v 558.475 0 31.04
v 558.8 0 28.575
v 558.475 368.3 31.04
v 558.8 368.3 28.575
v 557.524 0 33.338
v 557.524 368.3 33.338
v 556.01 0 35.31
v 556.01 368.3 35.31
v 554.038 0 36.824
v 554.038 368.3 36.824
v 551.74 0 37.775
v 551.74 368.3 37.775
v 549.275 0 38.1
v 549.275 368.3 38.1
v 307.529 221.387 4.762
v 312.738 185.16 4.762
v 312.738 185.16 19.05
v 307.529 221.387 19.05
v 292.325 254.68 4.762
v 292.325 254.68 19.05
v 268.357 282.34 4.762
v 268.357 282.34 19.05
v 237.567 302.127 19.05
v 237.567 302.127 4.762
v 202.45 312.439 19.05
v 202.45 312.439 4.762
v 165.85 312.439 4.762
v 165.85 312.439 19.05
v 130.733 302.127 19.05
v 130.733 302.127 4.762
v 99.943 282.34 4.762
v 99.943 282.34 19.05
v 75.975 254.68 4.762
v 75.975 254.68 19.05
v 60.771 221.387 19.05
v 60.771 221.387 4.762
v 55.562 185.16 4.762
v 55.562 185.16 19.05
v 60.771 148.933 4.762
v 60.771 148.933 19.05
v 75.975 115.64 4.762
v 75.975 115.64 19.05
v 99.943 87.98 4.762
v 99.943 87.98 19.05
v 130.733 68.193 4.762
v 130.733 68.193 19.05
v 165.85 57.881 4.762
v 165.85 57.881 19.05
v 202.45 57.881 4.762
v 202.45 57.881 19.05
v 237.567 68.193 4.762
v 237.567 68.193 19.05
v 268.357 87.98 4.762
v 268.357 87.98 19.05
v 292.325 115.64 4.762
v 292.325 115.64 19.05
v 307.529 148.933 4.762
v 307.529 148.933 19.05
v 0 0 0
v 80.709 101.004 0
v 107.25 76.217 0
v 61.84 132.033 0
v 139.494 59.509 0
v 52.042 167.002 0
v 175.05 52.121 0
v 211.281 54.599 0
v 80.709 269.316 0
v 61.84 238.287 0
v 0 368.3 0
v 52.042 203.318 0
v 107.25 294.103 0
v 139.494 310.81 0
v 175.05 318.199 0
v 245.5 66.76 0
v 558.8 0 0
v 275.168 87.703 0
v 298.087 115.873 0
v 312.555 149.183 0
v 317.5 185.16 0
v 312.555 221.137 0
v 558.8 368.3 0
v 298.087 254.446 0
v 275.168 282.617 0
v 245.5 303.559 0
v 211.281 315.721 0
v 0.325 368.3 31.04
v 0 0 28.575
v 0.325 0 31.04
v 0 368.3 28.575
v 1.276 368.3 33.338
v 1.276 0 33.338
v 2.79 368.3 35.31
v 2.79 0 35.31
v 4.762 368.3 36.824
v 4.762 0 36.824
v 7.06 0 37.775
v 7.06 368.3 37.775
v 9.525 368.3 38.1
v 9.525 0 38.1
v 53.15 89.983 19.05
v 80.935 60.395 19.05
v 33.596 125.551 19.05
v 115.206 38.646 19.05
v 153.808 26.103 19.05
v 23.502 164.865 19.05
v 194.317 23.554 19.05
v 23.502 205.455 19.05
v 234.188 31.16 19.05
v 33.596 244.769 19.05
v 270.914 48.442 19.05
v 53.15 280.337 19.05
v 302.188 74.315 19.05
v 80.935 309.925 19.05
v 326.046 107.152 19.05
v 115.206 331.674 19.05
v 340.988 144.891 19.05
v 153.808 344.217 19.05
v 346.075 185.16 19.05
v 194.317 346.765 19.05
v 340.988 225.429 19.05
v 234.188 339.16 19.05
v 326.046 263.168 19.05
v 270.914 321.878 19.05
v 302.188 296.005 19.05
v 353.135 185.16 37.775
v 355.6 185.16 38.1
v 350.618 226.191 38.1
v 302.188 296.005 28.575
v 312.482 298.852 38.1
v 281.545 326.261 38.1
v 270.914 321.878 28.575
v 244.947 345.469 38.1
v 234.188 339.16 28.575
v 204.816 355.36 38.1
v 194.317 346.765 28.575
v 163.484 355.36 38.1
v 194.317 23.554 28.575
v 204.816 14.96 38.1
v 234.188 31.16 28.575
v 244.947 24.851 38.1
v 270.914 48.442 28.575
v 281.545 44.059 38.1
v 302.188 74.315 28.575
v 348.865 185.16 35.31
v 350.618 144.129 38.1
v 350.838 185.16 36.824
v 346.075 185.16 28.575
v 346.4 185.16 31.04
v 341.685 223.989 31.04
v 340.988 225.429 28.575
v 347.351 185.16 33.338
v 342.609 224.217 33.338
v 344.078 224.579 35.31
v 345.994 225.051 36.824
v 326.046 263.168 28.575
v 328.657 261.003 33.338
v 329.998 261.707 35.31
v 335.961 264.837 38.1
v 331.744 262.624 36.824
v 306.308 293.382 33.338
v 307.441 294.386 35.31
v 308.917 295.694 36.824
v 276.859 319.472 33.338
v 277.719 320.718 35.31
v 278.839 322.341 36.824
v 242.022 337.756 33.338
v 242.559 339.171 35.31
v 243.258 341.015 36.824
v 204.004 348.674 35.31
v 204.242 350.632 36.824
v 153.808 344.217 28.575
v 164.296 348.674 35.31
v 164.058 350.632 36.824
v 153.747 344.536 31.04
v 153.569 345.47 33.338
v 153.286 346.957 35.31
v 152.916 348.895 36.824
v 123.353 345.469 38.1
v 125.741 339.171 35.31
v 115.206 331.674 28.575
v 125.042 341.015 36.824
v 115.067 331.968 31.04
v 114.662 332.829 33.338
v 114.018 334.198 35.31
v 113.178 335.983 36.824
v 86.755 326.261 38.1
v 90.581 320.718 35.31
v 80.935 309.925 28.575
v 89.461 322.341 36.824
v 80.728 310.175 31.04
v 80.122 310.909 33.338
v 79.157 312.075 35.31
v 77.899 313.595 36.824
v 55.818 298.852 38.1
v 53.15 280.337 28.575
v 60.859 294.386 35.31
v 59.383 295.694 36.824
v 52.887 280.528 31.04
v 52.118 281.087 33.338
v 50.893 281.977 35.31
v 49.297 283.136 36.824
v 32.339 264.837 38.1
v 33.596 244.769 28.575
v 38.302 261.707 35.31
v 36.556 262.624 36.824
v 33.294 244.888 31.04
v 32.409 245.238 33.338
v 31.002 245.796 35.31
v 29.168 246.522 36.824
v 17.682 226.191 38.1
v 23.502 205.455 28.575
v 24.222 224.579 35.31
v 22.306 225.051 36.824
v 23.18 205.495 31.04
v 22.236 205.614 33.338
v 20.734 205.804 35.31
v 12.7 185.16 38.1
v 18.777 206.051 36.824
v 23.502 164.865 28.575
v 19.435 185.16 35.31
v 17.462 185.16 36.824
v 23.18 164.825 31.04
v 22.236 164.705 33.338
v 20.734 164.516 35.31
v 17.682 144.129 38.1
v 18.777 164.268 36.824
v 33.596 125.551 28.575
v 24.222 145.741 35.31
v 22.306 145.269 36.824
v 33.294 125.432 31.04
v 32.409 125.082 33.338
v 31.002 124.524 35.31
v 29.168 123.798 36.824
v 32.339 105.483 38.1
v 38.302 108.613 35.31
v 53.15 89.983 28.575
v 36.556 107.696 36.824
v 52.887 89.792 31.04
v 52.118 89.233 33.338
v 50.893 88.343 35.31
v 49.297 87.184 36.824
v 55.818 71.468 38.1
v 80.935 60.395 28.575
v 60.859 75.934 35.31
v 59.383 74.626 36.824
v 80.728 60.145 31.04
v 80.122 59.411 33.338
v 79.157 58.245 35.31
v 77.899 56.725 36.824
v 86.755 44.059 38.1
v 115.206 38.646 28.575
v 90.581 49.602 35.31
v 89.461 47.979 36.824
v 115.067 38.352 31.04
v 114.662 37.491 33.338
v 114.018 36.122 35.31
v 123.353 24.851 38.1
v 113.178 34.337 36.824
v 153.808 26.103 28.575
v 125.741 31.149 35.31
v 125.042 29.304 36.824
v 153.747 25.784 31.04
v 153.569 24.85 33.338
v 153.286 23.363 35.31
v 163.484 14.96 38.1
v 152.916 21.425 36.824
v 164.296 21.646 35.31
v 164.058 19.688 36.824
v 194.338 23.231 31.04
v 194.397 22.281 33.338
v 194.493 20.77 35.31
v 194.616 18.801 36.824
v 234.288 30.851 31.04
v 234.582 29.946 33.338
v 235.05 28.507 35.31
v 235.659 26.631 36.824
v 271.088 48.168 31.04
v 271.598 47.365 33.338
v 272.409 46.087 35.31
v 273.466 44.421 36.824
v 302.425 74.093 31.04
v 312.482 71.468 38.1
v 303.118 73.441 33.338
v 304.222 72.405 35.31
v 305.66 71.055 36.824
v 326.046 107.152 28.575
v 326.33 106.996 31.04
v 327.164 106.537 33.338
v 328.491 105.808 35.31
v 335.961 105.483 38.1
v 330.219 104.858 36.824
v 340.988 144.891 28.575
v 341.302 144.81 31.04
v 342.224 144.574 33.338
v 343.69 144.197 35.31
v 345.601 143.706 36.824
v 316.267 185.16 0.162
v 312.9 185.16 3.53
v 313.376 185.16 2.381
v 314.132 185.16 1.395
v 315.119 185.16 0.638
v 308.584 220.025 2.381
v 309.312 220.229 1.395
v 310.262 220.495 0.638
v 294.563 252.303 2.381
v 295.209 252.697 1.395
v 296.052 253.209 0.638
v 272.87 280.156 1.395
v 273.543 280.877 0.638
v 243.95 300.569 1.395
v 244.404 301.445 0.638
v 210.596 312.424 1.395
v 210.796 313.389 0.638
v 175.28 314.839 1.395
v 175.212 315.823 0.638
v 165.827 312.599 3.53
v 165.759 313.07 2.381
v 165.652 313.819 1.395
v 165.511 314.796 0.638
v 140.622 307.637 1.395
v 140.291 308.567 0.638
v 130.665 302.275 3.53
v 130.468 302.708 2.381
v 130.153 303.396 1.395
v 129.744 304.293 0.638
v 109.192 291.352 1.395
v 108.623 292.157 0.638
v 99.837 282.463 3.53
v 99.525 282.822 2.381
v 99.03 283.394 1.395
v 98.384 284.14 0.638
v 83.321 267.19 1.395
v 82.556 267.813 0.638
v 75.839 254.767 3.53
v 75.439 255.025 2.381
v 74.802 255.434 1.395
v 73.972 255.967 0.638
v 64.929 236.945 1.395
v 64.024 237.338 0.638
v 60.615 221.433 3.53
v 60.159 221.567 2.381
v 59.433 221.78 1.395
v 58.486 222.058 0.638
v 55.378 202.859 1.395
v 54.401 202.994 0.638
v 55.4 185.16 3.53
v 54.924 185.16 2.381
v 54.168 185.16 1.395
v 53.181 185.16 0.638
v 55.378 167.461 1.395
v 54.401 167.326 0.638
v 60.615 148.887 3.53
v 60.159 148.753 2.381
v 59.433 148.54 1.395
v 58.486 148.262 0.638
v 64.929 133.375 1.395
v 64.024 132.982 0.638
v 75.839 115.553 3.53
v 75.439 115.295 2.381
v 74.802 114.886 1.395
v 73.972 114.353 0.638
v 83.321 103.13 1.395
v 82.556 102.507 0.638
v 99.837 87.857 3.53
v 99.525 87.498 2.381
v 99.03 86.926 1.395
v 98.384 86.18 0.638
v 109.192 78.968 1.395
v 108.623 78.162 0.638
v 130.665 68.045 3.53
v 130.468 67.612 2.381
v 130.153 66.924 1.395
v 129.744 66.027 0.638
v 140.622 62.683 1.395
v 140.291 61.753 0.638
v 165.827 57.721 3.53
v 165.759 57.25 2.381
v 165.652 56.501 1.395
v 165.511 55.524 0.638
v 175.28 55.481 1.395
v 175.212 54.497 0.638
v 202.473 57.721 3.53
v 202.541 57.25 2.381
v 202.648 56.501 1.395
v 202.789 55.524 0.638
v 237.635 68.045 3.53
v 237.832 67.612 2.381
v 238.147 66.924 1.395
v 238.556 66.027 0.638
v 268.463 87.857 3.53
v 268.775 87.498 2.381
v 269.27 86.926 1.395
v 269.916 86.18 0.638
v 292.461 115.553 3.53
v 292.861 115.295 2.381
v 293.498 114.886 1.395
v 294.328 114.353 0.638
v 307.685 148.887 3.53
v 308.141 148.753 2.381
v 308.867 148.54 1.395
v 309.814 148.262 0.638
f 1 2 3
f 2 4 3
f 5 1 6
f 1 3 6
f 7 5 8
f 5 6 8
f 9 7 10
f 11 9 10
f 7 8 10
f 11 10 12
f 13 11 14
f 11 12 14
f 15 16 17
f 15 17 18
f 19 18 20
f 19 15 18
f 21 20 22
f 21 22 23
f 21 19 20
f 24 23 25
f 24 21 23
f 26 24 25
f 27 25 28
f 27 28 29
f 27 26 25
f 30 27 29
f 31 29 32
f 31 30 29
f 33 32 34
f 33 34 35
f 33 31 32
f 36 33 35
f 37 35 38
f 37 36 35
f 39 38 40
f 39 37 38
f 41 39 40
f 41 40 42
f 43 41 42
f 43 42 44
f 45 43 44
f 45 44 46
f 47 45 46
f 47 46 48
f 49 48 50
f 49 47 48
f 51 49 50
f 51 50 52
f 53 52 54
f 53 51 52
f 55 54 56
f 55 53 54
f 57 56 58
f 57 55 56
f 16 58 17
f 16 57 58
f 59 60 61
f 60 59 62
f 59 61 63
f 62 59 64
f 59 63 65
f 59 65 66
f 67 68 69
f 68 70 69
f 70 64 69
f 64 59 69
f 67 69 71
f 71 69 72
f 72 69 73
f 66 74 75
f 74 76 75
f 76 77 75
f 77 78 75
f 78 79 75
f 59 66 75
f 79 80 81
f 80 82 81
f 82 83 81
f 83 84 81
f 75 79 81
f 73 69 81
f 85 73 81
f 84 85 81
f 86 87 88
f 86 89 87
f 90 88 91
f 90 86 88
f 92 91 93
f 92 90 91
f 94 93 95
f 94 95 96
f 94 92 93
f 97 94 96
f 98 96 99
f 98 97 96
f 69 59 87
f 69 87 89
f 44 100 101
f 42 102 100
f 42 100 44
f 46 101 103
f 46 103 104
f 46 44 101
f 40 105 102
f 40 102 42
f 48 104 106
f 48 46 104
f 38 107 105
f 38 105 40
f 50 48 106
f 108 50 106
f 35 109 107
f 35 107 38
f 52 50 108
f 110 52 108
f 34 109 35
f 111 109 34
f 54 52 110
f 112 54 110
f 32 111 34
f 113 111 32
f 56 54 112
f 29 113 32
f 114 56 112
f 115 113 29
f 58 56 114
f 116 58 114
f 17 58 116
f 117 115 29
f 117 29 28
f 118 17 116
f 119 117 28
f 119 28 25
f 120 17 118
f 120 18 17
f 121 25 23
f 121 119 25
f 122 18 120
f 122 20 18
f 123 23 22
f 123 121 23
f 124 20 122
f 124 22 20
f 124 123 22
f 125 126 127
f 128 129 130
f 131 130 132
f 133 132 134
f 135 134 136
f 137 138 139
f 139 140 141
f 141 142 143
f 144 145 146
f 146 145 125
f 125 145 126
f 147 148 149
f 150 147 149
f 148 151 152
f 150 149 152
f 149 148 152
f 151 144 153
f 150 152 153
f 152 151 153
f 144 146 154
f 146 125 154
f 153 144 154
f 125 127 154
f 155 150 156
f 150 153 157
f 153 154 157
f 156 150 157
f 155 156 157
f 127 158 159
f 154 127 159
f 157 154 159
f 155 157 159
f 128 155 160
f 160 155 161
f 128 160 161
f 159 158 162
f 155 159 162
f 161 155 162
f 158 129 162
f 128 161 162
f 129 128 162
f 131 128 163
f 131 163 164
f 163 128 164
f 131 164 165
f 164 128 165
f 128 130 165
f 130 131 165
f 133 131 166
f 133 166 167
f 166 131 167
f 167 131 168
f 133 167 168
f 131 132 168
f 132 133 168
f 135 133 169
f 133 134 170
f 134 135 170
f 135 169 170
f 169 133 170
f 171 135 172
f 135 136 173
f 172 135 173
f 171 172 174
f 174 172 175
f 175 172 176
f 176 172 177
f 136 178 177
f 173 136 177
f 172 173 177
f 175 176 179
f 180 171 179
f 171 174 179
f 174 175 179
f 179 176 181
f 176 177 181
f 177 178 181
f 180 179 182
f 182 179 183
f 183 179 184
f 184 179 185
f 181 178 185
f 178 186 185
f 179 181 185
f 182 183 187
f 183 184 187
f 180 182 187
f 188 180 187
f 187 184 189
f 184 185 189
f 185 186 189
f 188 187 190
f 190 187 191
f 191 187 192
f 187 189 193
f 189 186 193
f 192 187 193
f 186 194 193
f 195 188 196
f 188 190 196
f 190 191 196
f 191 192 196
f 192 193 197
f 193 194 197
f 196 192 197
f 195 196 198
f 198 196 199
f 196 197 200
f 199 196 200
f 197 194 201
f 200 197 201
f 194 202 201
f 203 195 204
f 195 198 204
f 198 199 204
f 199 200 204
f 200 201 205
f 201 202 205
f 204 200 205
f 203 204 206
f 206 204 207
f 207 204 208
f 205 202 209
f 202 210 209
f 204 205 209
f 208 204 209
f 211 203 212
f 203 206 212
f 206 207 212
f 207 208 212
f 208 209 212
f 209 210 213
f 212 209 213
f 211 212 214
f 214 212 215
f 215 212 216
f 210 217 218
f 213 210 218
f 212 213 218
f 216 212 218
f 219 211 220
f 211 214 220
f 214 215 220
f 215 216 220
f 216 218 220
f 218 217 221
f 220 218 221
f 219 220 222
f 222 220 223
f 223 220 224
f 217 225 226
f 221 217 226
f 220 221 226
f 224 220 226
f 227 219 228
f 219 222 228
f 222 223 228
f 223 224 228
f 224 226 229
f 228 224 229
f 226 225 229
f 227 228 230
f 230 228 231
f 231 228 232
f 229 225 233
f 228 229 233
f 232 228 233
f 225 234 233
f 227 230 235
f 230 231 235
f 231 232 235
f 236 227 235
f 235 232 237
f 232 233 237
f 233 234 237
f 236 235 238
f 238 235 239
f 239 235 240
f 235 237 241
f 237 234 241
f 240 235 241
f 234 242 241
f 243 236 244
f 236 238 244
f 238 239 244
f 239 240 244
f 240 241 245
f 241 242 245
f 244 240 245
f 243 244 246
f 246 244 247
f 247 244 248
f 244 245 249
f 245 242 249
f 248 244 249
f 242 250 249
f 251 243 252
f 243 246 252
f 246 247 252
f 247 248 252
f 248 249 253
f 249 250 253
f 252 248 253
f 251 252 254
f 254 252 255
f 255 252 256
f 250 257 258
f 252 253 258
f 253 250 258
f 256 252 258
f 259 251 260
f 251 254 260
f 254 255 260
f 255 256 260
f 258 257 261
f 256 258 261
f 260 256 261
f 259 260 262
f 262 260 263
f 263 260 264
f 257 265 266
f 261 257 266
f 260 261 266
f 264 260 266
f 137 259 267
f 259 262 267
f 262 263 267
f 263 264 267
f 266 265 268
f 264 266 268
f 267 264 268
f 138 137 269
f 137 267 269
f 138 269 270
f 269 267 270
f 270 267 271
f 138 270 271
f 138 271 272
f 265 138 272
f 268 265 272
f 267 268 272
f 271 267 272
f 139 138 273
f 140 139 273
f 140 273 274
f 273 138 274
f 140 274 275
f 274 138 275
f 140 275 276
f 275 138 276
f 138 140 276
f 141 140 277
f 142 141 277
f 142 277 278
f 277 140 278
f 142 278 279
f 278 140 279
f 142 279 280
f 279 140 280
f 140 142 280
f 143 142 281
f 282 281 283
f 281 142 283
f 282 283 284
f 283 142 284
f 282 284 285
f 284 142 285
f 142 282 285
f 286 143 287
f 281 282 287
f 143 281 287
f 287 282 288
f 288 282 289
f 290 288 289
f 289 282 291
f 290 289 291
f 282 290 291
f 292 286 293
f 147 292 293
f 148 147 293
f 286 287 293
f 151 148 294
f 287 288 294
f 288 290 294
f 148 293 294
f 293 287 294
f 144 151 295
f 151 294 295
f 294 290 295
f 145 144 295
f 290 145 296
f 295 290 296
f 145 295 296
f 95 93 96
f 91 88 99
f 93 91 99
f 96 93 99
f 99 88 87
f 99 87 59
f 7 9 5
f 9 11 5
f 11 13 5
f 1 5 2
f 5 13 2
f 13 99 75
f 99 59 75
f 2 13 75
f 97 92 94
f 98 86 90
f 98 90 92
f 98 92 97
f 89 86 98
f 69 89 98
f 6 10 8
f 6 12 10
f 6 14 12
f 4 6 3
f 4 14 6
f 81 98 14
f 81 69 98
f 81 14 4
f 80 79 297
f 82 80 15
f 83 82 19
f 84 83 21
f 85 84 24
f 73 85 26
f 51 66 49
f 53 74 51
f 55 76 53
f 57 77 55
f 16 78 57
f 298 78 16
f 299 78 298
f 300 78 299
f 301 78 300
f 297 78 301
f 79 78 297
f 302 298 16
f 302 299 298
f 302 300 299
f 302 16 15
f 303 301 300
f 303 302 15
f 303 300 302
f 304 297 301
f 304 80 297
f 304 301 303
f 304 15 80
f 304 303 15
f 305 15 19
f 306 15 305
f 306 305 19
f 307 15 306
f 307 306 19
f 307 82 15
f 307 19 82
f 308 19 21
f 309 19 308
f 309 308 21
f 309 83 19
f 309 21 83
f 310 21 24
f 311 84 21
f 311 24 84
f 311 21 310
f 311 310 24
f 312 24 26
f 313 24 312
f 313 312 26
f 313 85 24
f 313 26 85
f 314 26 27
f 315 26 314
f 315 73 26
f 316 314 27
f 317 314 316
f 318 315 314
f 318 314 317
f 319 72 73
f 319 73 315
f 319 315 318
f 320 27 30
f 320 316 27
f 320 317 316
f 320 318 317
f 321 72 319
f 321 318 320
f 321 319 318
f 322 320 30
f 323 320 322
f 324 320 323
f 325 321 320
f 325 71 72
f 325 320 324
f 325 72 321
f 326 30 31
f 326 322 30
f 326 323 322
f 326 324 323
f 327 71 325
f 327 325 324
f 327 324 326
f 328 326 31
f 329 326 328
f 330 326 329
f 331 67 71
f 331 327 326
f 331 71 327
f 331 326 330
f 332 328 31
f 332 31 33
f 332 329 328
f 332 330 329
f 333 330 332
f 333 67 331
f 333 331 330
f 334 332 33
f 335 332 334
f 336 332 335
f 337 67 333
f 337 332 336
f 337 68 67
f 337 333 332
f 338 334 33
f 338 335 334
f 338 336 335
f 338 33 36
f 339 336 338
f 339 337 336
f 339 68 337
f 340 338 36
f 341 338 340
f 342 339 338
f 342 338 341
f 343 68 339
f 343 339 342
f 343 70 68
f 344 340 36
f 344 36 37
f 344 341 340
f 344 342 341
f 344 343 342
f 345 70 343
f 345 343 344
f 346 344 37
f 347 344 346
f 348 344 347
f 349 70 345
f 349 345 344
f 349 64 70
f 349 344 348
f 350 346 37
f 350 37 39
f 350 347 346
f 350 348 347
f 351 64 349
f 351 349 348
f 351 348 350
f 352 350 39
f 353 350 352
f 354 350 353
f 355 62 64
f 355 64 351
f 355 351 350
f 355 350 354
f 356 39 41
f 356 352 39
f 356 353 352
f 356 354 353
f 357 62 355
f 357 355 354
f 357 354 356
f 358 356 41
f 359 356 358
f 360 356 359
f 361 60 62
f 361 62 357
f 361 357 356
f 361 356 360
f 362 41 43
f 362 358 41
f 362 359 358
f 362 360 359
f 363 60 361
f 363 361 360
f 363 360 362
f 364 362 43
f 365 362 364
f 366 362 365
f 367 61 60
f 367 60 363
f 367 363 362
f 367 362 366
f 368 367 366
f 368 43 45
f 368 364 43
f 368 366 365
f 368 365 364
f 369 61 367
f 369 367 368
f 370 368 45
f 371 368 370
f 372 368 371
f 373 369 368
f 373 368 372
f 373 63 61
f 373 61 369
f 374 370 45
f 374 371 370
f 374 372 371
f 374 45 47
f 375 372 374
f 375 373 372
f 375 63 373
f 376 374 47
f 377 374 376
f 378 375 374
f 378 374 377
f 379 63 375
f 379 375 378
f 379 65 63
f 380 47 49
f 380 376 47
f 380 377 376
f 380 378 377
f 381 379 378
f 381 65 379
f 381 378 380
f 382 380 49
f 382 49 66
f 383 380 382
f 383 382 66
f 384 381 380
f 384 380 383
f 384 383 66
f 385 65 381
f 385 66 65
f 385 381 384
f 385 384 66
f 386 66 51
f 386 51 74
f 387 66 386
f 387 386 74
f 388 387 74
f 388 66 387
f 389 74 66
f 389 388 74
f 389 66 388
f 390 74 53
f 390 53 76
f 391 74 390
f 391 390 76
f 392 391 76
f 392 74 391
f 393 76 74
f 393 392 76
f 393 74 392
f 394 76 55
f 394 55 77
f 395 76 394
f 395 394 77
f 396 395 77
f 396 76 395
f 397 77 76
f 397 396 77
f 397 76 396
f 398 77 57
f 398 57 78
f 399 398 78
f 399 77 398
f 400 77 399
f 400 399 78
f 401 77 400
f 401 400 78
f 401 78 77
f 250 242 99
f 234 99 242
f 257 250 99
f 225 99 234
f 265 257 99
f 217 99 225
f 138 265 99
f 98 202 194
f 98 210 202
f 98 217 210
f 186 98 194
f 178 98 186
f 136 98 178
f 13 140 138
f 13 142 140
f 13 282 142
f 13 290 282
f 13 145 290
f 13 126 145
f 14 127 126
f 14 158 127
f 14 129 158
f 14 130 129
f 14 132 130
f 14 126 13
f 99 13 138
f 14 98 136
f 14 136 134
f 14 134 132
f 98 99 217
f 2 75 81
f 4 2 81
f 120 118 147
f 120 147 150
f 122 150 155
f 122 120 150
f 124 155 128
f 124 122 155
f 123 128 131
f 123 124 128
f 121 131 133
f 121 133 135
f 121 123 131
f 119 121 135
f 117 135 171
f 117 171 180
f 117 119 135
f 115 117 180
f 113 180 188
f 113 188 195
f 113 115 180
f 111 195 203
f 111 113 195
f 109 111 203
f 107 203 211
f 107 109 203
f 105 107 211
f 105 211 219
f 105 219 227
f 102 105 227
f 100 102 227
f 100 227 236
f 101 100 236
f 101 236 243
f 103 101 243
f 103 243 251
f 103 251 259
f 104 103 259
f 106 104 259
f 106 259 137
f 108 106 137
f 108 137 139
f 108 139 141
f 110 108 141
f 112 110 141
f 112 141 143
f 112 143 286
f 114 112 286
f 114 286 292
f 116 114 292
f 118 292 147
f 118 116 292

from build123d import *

# Parameters (mm, degrees)
F0_W     = 558.8
F0_H     = 368.3
F0_R     = 161.925
F1_DEPTH = 38.1
F0_R_2   = 128.5875
F2_DEPTH = 19.05
F3_R     = 9.525
F4_R     = 4.7625
F5_R     = 9.525


with BuildPart() as f1:
    # F0 (on Top) → F1 (new body)
    with BuildSketch(Plane.XY):
        with Locations((279.4, 184.15)):
            Rectangle(F0_W, F0_H)
        with Locations((184.15, 185.159966)):
            Circle(F0_R, mode=Mode.SUBTRACT)
    extrude(amount=F1_DEPTH)

    # F0 (on Top) → F2 (join)
    with BuildSketch(Plane.XY):
        with Locations((184.15, 185.159966)):
            Circle(F0_R)
        with Locations((184.15, 185.159966)):
            Circle(F0_R_2, mode=Mode.SUBTRACT)
    extrude(amount=F2_DEPTH)

    # F3
    f3_edges = [f1.edges().sort_by_distance(p)[0] for p in [
        (22.225, 185.159966, 38.1),
    ]]
    fillet(f3_edges, radius=F3_R)

    # F4
    f4_edges = [f1.edges().sort_by_distance(p)[0] for p in [
        (55.5625, 185.159966, 0),
    ]]
    fillet(f4_edges, radius=F4_R)

    # F5
    f5_edges = [f1.edges().sort_by_distance(p)[0] for p in [
        (558.8, 184.15, 38.1),
        (0, 184.15, 38.1),
    ]]
    fillet(f5_edges, radius=F5_R)


solid = f1.part
